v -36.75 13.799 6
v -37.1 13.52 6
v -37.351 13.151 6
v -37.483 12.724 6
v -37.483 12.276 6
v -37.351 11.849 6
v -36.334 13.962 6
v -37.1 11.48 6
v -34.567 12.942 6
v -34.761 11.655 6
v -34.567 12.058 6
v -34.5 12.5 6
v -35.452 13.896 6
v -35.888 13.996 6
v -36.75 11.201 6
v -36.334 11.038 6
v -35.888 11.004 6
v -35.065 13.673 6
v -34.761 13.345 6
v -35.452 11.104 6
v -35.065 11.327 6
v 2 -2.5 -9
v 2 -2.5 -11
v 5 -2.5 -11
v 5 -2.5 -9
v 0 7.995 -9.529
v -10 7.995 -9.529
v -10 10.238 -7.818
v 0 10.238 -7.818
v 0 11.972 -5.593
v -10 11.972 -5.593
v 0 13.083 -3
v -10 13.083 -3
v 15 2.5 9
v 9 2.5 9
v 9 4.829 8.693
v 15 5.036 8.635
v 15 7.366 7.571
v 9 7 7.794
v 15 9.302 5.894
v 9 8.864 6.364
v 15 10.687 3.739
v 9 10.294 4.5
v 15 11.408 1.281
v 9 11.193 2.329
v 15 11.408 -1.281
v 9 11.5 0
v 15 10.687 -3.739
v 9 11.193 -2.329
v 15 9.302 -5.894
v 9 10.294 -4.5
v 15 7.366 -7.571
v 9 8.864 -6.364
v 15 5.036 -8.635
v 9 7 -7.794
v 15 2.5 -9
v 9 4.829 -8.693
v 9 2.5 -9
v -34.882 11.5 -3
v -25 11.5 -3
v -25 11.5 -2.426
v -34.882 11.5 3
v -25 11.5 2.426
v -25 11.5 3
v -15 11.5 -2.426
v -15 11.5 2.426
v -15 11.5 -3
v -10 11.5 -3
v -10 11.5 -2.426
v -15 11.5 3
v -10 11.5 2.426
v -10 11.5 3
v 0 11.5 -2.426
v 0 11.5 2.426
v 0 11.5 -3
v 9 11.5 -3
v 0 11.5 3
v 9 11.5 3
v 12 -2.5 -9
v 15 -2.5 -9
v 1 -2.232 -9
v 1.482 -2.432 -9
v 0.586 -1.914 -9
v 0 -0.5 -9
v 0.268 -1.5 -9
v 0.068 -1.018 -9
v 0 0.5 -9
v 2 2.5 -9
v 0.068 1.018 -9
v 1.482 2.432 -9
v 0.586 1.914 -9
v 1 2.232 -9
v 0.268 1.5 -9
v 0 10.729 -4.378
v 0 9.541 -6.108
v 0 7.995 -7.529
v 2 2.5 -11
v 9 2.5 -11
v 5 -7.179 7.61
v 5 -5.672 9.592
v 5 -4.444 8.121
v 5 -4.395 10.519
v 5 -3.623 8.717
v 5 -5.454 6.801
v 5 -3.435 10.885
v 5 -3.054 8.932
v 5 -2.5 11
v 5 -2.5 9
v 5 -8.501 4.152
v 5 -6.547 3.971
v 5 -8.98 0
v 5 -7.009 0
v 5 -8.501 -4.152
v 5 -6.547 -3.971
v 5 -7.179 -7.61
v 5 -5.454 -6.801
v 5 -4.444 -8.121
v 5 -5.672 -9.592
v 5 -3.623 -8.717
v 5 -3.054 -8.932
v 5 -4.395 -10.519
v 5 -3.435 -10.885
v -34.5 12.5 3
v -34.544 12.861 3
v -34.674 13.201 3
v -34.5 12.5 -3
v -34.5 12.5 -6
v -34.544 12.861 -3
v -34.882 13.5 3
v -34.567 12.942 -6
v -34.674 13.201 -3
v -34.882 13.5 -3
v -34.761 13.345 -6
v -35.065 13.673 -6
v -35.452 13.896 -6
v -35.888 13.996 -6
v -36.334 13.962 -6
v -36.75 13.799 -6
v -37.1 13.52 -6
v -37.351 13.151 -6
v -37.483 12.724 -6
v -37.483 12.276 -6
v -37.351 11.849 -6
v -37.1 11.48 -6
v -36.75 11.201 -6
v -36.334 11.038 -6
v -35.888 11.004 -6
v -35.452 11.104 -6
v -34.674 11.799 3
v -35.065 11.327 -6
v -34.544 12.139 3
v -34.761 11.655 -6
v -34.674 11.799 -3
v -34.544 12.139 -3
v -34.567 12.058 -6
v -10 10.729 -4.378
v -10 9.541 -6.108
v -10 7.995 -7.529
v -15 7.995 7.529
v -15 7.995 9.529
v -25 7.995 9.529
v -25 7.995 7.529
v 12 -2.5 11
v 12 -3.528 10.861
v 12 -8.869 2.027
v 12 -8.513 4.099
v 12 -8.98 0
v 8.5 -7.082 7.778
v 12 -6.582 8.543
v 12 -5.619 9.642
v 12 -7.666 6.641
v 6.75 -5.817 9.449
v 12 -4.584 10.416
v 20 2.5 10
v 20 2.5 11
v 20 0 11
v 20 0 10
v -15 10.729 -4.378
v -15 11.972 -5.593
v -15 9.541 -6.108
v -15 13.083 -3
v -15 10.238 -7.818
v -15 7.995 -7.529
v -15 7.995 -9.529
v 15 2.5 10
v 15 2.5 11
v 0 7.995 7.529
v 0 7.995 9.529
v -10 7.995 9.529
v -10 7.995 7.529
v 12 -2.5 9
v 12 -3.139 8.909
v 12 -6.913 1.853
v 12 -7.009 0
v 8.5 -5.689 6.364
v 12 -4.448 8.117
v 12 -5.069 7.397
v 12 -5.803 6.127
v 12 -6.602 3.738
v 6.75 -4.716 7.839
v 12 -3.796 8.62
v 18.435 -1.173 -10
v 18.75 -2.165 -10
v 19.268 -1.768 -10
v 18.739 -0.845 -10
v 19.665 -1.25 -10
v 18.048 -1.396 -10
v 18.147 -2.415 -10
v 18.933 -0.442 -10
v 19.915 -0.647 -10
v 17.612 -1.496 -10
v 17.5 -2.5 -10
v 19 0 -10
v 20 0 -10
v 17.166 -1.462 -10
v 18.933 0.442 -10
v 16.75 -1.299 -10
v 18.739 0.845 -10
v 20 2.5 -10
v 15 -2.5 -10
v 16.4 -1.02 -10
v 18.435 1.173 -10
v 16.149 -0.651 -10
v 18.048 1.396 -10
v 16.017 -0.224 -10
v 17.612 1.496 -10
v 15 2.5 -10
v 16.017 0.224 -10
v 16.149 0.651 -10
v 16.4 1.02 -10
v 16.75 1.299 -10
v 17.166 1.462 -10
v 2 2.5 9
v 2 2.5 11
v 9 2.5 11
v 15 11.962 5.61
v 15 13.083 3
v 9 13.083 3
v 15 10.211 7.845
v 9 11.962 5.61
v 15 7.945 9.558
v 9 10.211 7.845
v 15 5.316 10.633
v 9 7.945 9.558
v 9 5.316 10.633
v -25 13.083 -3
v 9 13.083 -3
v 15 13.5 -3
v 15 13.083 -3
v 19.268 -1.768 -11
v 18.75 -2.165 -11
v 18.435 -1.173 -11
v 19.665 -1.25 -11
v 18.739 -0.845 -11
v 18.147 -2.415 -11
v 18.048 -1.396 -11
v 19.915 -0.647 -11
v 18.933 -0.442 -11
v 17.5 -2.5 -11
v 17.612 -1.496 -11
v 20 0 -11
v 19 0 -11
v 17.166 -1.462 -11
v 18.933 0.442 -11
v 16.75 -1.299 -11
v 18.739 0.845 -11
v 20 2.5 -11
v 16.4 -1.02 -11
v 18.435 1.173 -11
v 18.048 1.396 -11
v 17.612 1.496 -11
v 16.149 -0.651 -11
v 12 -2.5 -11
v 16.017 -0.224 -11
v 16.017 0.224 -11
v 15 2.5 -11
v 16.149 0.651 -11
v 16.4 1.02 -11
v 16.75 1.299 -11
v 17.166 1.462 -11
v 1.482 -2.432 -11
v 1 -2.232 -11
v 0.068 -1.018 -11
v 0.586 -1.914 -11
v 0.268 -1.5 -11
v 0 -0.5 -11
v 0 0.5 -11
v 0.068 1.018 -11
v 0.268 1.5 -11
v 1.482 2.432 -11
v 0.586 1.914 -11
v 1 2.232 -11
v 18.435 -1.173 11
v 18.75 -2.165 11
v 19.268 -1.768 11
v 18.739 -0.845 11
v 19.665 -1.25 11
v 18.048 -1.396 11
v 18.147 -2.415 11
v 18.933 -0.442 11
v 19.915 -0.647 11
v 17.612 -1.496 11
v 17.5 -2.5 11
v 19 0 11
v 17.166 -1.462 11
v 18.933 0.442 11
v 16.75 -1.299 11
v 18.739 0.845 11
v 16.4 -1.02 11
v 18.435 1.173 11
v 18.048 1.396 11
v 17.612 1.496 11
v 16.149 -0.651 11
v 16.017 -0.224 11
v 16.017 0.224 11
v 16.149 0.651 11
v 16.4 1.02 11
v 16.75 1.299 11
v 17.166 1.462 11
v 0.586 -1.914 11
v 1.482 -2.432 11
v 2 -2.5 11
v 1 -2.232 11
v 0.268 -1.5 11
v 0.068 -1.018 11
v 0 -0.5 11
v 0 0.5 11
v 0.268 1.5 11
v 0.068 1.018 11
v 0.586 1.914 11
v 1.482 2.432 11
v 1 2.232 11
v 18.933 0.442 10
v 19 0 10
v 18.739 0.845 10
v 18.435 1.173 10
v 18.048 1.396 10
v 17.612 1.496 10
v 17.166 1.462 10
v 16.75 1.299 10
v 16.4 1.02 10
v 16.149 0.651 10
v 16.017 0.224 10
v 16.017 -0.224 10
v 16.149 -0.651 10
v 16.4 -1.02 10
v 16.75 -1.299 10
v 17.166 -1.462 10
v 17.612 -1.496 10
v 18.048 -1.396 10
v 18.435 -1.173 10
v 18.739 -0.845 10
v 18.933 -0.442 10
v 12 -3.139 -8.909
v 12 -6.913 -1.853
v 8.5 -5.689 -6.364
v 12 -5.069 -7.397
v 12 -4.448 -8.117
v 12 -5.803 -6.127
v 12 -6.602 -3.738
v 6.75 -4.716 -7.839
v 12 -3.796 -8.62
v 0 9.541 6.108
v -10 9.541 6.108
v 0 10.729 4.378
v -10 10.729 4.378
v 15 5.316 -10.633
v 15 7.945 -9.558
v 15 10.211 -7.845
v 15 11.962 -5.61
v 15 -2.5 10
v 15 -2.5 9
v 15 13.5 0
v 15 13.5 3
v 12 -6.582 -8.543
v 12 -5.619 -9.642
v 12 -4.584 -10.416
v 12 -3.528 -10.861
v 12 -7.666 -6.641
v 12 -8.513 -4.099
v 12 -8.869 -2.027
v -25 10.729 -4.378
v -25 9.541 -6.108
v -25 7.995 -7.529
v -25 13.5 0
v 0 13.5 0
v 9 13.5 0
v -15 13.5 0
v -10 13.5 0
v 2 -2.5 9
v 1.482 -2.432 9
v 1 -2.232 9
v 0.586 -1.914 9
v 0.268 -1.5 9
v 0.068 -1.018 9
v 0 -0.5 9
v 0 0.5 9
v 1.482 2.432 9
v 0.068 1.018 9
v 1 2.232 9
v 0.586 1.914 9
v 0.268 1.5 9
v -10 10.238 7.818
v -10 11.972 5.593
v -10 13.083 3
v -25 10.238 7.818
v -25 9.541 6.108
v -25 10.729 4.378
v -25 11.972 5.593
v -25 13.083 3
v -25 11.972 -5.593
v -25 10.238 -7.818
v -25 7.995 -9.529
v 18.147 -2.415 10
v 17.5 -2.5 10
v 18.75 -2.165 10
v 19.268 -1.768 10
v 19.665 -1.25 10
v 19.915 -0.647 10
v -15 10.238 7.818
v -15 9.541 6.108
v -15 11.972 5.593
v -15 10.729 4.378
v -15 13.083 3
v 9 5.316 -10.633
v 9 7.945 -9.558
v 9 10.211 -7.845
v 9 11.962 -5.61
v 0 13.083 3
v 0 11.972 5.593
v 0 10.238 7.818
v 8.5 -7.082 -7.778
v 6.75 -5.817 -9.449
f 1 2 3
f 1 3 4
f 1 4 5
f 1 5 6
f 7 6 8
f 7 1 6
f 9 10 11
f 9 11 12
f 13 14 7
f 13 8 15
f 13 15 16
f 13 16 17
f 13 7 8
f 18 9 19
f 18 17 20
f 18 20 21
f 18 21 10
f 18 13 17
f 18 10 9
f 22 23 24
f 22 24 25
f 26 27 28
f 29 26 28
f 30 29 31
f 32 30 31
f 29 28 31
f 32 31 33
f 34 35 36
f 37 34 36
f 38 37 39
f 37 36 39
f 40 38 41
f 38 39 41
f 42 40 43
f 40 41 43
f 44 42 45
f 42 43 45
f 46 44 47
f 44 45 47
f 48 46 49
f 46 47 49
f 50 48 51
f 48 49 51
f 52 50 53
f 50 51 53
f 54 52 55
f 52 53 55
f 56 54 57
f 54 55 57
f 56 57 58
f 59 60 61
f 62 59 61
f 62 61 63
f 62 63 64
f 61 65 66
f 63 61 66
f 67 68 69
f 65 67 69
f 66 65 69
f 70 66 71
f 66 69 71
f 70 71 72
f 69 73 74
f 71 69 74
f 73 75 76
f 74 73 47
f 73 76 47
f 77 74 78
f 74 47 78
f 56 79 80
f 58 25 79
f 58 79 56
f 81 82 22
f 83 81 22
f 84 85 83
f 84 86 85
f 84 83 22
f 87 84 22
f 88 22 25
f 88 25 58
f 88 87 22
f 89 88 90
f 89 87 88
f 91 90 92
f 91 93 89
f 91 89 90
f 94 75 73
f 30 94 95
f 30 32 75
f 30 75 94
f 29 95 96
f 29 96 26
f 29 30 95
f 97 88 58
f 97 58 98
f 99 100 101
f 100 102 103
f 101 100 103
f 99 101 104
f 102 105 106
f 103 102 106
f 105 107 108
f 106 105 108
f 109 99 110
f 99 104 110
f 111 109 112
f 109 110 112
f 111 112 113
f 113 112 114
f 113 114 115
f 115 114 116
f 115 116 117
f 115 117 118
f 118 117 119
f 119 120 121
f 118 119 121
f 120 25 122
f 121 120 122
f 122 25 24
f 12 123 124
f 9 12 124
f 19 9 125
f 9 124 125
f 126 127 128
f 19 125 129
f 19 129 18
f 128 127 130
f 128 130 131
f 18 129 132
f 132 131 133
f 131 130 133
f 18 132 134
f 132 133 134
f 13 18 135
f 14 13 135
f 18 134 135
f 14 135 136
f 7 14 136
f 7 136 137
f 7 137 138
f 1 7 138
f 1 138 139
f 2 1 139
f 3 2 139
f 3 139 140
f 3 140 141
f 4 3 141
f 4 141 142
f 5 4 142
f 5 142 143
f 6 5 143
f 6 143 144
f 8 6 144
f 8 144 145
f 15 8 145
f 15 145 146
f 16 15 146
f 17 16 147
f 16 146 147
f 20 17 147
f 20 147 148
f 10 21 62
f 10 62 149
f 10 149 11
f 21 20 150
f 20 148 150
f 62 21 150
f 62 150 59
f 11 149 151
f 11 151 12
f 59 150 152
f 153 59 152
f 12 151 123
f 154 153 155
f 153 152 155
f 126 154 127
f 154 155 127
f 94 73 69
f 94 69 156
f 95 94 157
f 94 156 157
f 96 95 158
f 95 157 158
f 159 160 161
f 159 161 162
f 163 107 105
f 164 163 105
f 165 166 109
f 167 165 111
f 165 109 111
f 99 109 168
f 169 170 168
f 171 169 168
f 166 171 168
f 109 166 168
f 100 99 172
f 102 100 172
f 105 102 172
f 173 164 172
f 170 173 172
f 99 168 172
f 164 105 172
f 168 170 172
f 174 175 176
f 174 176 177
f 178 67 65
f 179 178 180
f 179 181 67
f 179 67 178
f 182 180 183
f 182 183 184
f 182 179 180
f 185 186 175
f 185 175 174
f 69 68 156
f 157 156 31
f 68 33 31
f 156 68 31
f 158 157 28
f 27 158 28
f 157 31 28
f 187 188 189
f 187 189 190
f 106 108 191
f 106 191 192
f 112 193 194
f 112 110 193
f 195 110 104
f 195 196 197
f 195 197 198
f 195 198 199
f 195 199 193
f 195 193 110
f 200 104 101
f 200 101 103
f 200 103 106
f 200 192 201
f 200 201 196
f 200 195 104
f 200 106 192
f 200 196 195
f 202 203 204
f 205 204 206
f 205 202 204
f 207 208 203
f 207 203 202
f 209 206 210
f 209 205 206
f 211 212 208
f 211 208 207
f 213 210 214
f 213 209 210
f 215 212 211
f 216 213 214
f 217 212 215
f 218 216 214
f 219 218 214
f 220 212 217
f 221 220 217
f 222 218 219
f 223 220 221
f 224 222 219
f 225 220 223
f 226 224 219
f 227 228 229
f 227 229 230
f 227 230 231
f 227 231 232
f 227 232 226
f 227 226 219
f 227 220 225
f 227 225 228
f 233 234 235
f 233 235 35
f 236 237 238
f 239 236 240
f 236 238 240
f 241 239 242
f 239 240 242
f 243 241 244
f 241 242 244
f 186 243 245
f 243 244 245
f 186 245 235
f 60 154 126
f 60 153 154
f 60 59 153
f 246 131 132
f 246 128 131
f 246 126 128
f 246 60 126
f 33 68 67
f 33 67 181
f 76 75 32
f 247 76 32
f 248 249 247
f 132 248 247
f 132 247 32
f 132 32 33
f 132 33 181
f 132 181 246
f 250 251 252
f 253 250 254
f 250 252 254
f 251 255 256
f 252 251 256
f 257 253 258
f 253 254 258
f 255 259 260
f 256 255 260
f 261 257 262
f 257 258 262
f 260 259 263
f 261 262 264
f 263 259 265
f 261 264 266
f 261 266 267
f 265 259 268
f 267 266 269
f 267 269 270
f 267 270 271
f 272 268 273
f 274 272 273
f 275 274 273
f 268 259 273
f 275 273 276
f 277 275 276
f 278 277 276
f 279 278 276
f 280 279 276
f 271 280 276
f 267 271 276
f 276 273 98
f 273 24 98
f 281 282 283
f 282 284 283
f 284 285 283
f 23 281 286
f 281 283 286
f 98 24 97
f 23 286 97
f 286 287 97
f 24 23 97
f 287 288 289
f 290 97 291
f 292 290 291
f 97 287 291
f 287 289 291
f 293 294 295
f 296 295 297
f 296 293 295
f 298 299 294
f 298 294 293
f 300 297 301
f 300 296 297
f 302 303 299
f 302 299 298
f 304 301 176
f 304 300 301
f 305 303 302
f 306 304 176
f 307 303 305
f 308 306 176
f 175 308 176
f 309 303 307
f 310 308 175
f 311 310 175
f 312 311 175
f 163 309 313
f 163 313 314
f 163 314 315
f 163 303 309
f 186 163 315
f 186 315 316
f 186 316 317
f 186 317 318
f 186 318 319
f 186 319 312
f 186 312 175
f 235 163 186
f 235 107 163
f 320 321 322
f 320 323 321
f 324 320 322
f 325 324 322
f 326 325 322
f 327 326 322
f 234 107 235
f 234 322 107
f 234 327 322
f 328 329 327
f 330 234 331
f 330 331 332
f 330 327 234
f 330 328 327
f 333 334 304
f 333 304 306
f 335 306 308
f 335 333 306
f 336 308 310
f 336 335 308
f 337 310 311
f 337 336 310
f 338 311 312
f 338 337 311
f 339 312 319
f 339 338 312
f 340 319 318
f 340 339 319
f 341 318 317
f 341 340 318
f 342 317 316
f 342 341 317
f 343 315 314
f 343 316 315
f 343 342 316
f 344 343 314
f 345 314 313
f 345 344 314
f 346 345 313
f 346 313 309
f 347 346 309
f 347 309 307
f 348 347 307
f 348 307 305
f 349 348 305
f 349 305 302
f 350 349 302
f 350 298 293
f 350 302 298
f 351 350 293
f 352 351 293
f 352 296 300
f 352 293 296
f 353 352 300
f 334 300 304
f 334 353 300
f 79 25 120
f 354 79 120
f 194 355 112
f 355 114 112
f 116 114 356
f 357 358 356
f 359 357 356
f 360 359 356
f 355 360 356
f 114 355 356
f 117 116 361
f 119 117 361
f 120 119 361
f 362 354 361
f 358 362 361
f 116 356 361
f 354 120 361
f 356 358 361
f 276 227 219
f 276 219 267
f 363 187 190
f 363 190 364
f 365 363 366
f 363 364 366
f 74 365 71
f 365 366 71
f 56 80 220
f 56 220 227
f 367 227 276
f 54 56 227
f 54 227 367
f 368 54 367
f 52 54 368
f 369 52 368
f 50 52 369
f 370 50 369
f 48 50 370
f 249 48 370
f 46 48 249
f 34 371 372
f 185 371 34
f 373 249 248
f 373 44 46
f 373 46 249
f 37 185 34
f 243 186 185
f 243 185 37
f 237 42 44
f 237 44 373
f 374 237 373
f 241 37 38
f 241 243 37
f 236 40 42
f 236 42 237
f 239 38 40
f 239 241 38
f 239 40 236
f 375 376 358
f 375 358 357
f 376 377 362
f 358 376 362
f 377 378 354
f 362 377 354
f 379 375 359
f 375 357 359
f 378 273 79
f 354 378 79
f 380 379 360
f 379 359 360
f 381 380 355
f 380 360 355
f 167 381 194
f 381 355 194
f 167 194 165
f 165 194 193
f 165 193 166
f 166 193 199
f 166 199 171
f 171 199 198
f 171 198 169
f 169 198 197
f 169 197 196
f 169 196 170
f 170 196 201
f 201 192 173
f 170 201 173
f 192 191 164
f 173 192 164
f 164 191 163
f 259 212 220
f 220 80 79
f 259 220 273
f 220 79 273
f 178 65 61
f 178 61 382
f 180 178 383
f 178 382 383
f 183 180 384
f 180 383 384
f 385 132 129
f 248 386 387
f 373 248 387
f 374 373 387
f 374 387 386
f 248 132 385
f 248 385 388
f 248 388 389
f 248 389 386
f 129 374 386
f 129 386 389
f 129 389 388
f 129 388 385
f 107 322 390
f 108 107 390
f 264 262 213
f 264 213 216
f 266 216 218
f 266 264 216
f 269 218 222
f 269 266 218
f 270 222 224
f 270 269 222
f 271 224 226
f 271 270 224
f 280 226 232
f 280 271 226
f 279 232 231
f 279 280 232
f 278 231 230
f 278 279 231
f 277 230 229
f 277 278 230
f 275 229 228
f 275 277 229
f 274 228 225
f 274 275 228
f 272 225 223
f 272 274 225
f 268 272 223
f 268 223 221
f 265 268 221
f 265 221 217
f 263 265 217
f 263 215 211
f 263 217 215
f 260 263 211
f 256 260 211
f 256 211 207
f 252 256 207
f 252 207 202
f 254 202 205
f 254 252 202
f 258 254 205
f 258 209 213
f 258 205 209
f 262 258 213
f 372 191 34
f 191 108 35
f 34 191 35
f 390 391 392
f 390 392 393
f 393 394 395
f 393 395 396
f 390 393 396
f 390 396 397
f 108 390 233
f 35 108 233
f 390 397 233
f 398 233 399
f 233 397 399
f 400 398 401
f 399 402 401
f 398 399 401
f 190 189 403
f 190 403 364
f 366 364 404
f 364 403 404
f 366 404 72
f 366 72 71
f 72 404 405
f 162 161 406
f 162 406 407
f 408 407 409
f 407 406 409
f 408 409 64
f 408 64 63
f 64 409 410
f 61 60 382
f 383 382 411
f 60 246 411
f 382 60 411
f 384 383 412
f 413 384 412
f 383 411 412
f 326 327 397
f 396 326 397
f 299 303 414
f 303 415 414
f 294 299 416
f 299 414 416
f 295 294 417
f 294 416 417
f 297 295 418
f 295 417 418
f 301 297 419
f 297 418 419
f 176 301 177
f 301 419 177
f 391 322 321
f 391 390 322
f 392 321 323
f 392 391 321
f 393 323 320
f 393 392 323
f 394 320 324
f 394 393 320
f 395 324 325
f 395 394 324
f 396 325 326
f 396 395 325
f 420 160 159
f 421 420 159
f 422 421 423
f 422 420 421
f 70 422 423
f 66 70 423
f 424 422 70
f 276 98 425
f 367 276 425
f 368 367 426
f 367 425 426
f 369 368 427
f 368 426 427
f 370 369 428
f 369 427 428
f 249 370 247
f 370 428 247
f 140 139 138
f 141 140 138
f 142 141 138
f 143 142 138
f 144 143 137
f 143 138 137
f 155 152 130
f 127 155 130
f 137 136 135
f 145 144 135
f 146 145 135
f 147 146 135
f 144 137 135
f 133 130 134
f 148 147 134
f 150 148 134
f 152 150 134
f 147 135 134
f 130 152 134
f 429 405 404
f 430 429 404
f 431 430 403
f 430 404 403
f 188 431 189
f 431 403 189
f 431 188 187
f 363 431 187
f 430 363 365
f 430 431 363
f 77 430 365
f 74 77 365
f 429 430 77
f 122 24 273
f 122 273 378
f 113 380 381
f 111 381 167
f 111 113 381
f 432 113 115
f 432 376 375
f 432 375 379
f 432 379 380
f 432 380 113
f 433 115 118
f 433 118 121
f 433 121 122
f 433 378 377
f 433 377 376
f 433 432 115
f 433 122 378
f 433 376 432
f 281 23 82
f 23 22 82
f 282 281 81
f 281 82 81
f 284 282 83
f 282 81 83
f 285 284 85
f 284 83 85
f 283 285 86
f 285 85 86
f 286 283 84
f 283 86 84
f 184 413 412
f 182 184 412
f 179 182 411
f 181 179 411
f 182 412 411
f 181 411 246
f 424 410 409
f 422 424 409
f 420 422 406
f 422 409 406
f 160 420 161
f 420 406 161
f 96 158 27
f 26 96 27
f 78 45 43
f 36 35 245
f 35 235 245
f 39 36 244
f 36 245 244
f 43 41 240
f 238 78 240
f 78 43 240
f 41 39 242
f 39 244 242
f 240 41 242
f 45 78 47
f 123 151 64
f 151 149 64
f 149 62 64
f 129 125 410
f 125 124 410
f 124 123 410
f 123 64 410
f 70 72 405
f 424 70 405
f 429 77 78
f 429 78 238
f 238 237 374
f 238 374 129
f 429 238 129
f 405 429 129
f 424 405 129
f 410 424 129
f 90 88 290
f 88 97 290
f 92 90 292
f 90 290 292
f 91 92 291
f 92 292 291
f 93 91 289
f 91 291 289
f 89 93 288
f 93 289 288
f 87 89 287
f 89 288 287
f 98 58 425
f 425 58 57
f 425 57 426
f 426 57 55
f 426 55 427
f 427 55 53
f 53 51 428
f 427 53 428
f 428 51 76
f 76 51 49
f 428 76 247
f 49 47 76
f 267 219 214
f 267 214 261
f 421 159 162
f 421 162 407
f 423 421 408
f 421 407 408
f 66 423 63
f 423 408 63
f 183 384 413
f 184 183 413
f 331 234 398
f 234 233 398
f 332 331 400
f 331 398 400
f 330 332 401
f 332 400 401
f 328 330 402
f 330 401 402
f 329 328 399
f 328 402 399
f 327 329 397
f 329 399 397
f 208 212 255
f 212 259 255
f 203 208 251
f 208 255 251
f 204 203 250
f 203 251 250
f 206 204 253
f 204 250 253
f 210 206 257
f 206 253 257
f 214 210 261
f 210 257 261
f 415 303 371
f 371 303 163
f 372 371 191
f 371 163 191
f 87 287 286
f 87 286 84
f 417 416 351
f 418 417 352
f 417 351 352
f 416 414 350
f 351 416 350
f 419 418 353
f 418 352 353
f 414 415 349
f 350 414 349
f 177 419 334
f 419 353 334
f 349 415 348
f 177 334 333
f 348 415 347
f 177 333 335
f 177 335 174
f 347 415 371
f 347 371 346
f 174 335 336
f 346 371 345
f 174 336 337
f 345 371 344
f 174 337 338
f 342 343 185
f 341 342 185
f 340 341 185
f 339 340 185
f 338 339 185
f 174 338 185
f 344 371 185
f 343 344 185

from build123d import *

# Parameters (mm, degrees)
SKETCH1_W                = 2
SKETCH1_H                = 5
BOSS_EXTRUDE1_DEPTH      = 15
BOSS_EXTRUDE1_2_DEPTH    = 15
SKETCH2_W                = 1
SKETCH2_H                = 5
BOSS_EXTRUDE2_DEPTH      = 5
CUT_EXTRUDE1_DEPTH       = 30.107559156
CUT_EXTRUDE1_DEPTH_BACK  = 30.107559156
SKETCH3_R                = 1.5
SWEEP1_START             = 9
SWEEP1_DEPTH             = 6
BOSS_EXTRUDE3_DEPTH      = 12
CUT_EXTRUDE2_DEPTH       = 5
FILLET1_R                = 2
BOSS_EXTRUDE6_START      = -6
SKETCH7_W                = 6
SKETCH7_H                = 2
BOSS_EXTRUDE6_DEPTH      = 51
BOSS_EXTRUDE7_DEPTH      = 3
BOSS_EXTRUDE7_DEPTH_BACK = 9
SKETCH8_R                = 1.5
FILLET2_R                = 2.5
BOSS_EXTRUDE10_DEPTH     = 10
LPATTERN1_COUNT          = 2
LPATTERN1_PITCH          = 15


# Read off the part's stored shape, not the designer's step: Sweep1
with BuildPart() as part:
    # Sketch1 → Boss-Extrude1 (new body)
    with BuildSketch(Plane(origin=(0, 0, 0), x_dir=(0, 0, -1), z_dir=(1, 0, 0))):
        with Locations((-10, 0)):
            Rectangle(SKETCH1_W, SKETCH1_H)
    extrude(amount=BOSS_EXTRUDE1_DEPTH)



with BuildPart() as body_2:
    # Sketch1 → Boss-Extrude1 2 (new body)
    with BuildSketch(Plane(origin=(0, 0, 0), x_dir=(0, 0, -1), z_dir=(1, 0, 0))):
        with Locations((10, 0)):
            Rectangle(SKETCH1_W, SKETCH1_H)
    extrude(amount=BOSS_EXTRUDE1_2_DEPTH)


with BuildPart() as part_1:
    add(part.part)

    add(body_2.part)  # Boss-Extrude2 merges body 2
    # Sketch2 → Boss-Extrude2 (add)
    with BuildSketch(Plane(origin=(15, 0, 0), x_dir=(0, 0, -1), z_dir=(1, 0, 0))):
        with Locations((10.5, 0)):
            Rectangle(SKETCH2_W, SKETCH2_H)
        with Locations((-10.5, 0)):
            Rectangle(SKETCH2_W, SKETCH2_H)
    extrude(amount=BOSS_EXTRUDE2_DEPTH)

    # Sketch3 → Cut-Extrude1 (cut, two sides: drawn at the far end of the back side and taken through both)
    with BuildSketch(Plane.XY.offset(-10).offset(-CUT_EXTRUDE1_DEPTH_BACK)):
        with Locations((17.5, 0)):
            Circle(SKETCH3_R)
    extrude(amount=CUT_EXTRUDE1_DEPTH + CUT_EXTRUDE1_DEPTH_BACK, mode=Mode.SUBTRACT)

    # Sweep1 outline → Sweep1 (add)
    with BuildSketch(Plane.YZ.offset(SWEEP1_START)):
        with BuildLine():
            ThreePointArc((2.5, -11), (13.5, 0), (2.5, 11))
            Line((2.5, 11), (2.5, 9))
            ThreePointArc((2.5, 9), (11.5, 0), (2.5, -9))
            Line((2.5, -9), (2.5, -11))
        make_face()
    extrude(amount=SWEEP1_DEPTH)

    # Sketch5 → Boss-Extrude3 (add)
    with BuildSketch(Plane(origin=(0, 0, 0), x_dir=(0, 0, -1), z_dir=(1, 0, 0))):
        with BuildLine():
            Line((-9, -2.5), (-11, -2.5))
            add(Edge.make_bspline(
                [(-11, -2.5), (-11, -8.980170496), (0, -8.980170496)],
                knots=[3.141592654, 3.141592654, 3.141592654, 4.71238898, 4.71238898, 4.71238898], degree=2, weights=[1, 0.707106781, 1]))
            Line((0, -8.980170496), (0, -7.009343108))
            add(Edge.make_bspline(
                [(-9, -2.5), (-9, -7.009343108), (0, -7.009343108)],
                knots=[3.141592654, 3.141592654, 3.141592654, 4.71238898, 4.71238898, 4.71238898], degree=2, weights=[1, 0.707106781, 1]))
        make_face()
    boss_extrude3 = extrude(amount=BOSS_EXTRUDE3_DEPTH)

    # Sketch6 → Cut-Extrude2 (cut)
    with BuildSketch(Plane.ZY):
        with BuildLine():
            Line((11, -2.5), (9, -2.5))
            add(Edge.make_bspline(
                [(0, -7.009343108), (9, -7.009343108), (9, -2.5)],
                knots=[4.71238898, 4.71238898, 4.71238898, 6.283185307, 6.283185307, 6.283185307], degree=2, weights=[1, 0.707106781, 1]))
            Line((0, -7.009343108), (0, -8.980170496))
            add(Edge.make_bspline(
                [(0, -8.980170496), (11, -8.980170496), (11, -2.5)],
                knots=[4.71238898, 4.71238898, 4.71238898, 6.283185307, 6.283185307, 6.283185307], degree=2, weights=[1, 0.707106781, 1]))
        make_face()
    cut_extrude2 = extrude(amount=-CUT_EXTRUDE2_DEPTH, mode=Mode.SUBTRACT)

    # Mirror2: Boss-Extrude3, Cut-Extrude2 across plane
    add(boss_extrude3.mirror(Plane(origin=(12, -8.980170496, 0), x_dir=(1, 0, 0), z_dir=(0, 0, 1))))
    add(cut_extrude2.mirror(Plane(origin=(12, -8.980170496, 0), x_dir=(1, 0, 0), z_dir=(0, 0, 1))), mode=Mode.SUBTRACT)

    # Fillet1
    fillet1_edges = [part_1.edges().sort_by_distance(p)[0] for p in [
        (0, -2.5, -10),
        (0, 2.5, -10),
        (0, 2.5, 10),
        (0, -2.5, 10),
    ]]
    fillet(fillet1_edges, radius=FILLET1_R)

    # Sketch7 → Boss-Extrude6 (add)
    with BuildSketch(Plane.ZY.offset(-9).offset(BOSS_EXTRUDE6_START)):
        with Locations((0, 12.5)):
            Rectangle(SKETCH7_W, SKETCH7_H)
    extrude(amount=BOSS_EXTRUDE6_DEPTH)

    # Sketch8 → Boss-Extrude7 (add, two sides: drawn at the far end of the back side and taken through both)
    with BuildSketch(Plane.XY.offset(3).offset(-BOSS_EXTRUDE7_DEPTH_BACK)):
        with Locations((-36, 12.5)):
            Circle(SKETCH8_R)
    extrude(amount=BOSS_EXTRUDE7_DEPTH + BOSS_EXTRUDE7_DEPTH_BACK)

    # Fillet2
    fillet2_edges = [part_1.edges().sort_by_distance(p)[0] for p in [
        (20, -2.5, -10.5),
        (20, -2.5, 10.5),
    ]]
    fillet(fillet2_edges, radius=FILLET2_R)

    # 3DSketch3 → Boss-Extrude10 (add)
    with BuildSketch(Plane(origin=(-10, 7.995255445, 9.529017137), x_dir=(0, 0, -1), z_dir=(1, 0, 0))):
        with BuildLine():
            Line((0, 0), (2, 0))
            ThreePointArc((2, 0), (9.529017137, 3.825899604), (17.058034273, 0))
            Line((17.058034273, 0), (19.058034273, 0))
            ThreePointArc((19.058034273, 0), (15.031388903, 4.029654263), (9.529017137, 5.504744555))
            ThreePointArc((9.529017137, 5.504744555), (4.026645371, 4.029654263), (0, 0))
        make_face()
    boss_extrude10 = extrude(amount=BOSS_EXTRUDE10_DEPTH)

    # LPattern1: Boss-Extrude10 ×2
    with Locations(*[(-i * LPATTERN1_PITCH, 0, 0) for i in range(1, LPATTERN1_COUNT)]):
        add(boss_extrude10)


solid = part_1.part
